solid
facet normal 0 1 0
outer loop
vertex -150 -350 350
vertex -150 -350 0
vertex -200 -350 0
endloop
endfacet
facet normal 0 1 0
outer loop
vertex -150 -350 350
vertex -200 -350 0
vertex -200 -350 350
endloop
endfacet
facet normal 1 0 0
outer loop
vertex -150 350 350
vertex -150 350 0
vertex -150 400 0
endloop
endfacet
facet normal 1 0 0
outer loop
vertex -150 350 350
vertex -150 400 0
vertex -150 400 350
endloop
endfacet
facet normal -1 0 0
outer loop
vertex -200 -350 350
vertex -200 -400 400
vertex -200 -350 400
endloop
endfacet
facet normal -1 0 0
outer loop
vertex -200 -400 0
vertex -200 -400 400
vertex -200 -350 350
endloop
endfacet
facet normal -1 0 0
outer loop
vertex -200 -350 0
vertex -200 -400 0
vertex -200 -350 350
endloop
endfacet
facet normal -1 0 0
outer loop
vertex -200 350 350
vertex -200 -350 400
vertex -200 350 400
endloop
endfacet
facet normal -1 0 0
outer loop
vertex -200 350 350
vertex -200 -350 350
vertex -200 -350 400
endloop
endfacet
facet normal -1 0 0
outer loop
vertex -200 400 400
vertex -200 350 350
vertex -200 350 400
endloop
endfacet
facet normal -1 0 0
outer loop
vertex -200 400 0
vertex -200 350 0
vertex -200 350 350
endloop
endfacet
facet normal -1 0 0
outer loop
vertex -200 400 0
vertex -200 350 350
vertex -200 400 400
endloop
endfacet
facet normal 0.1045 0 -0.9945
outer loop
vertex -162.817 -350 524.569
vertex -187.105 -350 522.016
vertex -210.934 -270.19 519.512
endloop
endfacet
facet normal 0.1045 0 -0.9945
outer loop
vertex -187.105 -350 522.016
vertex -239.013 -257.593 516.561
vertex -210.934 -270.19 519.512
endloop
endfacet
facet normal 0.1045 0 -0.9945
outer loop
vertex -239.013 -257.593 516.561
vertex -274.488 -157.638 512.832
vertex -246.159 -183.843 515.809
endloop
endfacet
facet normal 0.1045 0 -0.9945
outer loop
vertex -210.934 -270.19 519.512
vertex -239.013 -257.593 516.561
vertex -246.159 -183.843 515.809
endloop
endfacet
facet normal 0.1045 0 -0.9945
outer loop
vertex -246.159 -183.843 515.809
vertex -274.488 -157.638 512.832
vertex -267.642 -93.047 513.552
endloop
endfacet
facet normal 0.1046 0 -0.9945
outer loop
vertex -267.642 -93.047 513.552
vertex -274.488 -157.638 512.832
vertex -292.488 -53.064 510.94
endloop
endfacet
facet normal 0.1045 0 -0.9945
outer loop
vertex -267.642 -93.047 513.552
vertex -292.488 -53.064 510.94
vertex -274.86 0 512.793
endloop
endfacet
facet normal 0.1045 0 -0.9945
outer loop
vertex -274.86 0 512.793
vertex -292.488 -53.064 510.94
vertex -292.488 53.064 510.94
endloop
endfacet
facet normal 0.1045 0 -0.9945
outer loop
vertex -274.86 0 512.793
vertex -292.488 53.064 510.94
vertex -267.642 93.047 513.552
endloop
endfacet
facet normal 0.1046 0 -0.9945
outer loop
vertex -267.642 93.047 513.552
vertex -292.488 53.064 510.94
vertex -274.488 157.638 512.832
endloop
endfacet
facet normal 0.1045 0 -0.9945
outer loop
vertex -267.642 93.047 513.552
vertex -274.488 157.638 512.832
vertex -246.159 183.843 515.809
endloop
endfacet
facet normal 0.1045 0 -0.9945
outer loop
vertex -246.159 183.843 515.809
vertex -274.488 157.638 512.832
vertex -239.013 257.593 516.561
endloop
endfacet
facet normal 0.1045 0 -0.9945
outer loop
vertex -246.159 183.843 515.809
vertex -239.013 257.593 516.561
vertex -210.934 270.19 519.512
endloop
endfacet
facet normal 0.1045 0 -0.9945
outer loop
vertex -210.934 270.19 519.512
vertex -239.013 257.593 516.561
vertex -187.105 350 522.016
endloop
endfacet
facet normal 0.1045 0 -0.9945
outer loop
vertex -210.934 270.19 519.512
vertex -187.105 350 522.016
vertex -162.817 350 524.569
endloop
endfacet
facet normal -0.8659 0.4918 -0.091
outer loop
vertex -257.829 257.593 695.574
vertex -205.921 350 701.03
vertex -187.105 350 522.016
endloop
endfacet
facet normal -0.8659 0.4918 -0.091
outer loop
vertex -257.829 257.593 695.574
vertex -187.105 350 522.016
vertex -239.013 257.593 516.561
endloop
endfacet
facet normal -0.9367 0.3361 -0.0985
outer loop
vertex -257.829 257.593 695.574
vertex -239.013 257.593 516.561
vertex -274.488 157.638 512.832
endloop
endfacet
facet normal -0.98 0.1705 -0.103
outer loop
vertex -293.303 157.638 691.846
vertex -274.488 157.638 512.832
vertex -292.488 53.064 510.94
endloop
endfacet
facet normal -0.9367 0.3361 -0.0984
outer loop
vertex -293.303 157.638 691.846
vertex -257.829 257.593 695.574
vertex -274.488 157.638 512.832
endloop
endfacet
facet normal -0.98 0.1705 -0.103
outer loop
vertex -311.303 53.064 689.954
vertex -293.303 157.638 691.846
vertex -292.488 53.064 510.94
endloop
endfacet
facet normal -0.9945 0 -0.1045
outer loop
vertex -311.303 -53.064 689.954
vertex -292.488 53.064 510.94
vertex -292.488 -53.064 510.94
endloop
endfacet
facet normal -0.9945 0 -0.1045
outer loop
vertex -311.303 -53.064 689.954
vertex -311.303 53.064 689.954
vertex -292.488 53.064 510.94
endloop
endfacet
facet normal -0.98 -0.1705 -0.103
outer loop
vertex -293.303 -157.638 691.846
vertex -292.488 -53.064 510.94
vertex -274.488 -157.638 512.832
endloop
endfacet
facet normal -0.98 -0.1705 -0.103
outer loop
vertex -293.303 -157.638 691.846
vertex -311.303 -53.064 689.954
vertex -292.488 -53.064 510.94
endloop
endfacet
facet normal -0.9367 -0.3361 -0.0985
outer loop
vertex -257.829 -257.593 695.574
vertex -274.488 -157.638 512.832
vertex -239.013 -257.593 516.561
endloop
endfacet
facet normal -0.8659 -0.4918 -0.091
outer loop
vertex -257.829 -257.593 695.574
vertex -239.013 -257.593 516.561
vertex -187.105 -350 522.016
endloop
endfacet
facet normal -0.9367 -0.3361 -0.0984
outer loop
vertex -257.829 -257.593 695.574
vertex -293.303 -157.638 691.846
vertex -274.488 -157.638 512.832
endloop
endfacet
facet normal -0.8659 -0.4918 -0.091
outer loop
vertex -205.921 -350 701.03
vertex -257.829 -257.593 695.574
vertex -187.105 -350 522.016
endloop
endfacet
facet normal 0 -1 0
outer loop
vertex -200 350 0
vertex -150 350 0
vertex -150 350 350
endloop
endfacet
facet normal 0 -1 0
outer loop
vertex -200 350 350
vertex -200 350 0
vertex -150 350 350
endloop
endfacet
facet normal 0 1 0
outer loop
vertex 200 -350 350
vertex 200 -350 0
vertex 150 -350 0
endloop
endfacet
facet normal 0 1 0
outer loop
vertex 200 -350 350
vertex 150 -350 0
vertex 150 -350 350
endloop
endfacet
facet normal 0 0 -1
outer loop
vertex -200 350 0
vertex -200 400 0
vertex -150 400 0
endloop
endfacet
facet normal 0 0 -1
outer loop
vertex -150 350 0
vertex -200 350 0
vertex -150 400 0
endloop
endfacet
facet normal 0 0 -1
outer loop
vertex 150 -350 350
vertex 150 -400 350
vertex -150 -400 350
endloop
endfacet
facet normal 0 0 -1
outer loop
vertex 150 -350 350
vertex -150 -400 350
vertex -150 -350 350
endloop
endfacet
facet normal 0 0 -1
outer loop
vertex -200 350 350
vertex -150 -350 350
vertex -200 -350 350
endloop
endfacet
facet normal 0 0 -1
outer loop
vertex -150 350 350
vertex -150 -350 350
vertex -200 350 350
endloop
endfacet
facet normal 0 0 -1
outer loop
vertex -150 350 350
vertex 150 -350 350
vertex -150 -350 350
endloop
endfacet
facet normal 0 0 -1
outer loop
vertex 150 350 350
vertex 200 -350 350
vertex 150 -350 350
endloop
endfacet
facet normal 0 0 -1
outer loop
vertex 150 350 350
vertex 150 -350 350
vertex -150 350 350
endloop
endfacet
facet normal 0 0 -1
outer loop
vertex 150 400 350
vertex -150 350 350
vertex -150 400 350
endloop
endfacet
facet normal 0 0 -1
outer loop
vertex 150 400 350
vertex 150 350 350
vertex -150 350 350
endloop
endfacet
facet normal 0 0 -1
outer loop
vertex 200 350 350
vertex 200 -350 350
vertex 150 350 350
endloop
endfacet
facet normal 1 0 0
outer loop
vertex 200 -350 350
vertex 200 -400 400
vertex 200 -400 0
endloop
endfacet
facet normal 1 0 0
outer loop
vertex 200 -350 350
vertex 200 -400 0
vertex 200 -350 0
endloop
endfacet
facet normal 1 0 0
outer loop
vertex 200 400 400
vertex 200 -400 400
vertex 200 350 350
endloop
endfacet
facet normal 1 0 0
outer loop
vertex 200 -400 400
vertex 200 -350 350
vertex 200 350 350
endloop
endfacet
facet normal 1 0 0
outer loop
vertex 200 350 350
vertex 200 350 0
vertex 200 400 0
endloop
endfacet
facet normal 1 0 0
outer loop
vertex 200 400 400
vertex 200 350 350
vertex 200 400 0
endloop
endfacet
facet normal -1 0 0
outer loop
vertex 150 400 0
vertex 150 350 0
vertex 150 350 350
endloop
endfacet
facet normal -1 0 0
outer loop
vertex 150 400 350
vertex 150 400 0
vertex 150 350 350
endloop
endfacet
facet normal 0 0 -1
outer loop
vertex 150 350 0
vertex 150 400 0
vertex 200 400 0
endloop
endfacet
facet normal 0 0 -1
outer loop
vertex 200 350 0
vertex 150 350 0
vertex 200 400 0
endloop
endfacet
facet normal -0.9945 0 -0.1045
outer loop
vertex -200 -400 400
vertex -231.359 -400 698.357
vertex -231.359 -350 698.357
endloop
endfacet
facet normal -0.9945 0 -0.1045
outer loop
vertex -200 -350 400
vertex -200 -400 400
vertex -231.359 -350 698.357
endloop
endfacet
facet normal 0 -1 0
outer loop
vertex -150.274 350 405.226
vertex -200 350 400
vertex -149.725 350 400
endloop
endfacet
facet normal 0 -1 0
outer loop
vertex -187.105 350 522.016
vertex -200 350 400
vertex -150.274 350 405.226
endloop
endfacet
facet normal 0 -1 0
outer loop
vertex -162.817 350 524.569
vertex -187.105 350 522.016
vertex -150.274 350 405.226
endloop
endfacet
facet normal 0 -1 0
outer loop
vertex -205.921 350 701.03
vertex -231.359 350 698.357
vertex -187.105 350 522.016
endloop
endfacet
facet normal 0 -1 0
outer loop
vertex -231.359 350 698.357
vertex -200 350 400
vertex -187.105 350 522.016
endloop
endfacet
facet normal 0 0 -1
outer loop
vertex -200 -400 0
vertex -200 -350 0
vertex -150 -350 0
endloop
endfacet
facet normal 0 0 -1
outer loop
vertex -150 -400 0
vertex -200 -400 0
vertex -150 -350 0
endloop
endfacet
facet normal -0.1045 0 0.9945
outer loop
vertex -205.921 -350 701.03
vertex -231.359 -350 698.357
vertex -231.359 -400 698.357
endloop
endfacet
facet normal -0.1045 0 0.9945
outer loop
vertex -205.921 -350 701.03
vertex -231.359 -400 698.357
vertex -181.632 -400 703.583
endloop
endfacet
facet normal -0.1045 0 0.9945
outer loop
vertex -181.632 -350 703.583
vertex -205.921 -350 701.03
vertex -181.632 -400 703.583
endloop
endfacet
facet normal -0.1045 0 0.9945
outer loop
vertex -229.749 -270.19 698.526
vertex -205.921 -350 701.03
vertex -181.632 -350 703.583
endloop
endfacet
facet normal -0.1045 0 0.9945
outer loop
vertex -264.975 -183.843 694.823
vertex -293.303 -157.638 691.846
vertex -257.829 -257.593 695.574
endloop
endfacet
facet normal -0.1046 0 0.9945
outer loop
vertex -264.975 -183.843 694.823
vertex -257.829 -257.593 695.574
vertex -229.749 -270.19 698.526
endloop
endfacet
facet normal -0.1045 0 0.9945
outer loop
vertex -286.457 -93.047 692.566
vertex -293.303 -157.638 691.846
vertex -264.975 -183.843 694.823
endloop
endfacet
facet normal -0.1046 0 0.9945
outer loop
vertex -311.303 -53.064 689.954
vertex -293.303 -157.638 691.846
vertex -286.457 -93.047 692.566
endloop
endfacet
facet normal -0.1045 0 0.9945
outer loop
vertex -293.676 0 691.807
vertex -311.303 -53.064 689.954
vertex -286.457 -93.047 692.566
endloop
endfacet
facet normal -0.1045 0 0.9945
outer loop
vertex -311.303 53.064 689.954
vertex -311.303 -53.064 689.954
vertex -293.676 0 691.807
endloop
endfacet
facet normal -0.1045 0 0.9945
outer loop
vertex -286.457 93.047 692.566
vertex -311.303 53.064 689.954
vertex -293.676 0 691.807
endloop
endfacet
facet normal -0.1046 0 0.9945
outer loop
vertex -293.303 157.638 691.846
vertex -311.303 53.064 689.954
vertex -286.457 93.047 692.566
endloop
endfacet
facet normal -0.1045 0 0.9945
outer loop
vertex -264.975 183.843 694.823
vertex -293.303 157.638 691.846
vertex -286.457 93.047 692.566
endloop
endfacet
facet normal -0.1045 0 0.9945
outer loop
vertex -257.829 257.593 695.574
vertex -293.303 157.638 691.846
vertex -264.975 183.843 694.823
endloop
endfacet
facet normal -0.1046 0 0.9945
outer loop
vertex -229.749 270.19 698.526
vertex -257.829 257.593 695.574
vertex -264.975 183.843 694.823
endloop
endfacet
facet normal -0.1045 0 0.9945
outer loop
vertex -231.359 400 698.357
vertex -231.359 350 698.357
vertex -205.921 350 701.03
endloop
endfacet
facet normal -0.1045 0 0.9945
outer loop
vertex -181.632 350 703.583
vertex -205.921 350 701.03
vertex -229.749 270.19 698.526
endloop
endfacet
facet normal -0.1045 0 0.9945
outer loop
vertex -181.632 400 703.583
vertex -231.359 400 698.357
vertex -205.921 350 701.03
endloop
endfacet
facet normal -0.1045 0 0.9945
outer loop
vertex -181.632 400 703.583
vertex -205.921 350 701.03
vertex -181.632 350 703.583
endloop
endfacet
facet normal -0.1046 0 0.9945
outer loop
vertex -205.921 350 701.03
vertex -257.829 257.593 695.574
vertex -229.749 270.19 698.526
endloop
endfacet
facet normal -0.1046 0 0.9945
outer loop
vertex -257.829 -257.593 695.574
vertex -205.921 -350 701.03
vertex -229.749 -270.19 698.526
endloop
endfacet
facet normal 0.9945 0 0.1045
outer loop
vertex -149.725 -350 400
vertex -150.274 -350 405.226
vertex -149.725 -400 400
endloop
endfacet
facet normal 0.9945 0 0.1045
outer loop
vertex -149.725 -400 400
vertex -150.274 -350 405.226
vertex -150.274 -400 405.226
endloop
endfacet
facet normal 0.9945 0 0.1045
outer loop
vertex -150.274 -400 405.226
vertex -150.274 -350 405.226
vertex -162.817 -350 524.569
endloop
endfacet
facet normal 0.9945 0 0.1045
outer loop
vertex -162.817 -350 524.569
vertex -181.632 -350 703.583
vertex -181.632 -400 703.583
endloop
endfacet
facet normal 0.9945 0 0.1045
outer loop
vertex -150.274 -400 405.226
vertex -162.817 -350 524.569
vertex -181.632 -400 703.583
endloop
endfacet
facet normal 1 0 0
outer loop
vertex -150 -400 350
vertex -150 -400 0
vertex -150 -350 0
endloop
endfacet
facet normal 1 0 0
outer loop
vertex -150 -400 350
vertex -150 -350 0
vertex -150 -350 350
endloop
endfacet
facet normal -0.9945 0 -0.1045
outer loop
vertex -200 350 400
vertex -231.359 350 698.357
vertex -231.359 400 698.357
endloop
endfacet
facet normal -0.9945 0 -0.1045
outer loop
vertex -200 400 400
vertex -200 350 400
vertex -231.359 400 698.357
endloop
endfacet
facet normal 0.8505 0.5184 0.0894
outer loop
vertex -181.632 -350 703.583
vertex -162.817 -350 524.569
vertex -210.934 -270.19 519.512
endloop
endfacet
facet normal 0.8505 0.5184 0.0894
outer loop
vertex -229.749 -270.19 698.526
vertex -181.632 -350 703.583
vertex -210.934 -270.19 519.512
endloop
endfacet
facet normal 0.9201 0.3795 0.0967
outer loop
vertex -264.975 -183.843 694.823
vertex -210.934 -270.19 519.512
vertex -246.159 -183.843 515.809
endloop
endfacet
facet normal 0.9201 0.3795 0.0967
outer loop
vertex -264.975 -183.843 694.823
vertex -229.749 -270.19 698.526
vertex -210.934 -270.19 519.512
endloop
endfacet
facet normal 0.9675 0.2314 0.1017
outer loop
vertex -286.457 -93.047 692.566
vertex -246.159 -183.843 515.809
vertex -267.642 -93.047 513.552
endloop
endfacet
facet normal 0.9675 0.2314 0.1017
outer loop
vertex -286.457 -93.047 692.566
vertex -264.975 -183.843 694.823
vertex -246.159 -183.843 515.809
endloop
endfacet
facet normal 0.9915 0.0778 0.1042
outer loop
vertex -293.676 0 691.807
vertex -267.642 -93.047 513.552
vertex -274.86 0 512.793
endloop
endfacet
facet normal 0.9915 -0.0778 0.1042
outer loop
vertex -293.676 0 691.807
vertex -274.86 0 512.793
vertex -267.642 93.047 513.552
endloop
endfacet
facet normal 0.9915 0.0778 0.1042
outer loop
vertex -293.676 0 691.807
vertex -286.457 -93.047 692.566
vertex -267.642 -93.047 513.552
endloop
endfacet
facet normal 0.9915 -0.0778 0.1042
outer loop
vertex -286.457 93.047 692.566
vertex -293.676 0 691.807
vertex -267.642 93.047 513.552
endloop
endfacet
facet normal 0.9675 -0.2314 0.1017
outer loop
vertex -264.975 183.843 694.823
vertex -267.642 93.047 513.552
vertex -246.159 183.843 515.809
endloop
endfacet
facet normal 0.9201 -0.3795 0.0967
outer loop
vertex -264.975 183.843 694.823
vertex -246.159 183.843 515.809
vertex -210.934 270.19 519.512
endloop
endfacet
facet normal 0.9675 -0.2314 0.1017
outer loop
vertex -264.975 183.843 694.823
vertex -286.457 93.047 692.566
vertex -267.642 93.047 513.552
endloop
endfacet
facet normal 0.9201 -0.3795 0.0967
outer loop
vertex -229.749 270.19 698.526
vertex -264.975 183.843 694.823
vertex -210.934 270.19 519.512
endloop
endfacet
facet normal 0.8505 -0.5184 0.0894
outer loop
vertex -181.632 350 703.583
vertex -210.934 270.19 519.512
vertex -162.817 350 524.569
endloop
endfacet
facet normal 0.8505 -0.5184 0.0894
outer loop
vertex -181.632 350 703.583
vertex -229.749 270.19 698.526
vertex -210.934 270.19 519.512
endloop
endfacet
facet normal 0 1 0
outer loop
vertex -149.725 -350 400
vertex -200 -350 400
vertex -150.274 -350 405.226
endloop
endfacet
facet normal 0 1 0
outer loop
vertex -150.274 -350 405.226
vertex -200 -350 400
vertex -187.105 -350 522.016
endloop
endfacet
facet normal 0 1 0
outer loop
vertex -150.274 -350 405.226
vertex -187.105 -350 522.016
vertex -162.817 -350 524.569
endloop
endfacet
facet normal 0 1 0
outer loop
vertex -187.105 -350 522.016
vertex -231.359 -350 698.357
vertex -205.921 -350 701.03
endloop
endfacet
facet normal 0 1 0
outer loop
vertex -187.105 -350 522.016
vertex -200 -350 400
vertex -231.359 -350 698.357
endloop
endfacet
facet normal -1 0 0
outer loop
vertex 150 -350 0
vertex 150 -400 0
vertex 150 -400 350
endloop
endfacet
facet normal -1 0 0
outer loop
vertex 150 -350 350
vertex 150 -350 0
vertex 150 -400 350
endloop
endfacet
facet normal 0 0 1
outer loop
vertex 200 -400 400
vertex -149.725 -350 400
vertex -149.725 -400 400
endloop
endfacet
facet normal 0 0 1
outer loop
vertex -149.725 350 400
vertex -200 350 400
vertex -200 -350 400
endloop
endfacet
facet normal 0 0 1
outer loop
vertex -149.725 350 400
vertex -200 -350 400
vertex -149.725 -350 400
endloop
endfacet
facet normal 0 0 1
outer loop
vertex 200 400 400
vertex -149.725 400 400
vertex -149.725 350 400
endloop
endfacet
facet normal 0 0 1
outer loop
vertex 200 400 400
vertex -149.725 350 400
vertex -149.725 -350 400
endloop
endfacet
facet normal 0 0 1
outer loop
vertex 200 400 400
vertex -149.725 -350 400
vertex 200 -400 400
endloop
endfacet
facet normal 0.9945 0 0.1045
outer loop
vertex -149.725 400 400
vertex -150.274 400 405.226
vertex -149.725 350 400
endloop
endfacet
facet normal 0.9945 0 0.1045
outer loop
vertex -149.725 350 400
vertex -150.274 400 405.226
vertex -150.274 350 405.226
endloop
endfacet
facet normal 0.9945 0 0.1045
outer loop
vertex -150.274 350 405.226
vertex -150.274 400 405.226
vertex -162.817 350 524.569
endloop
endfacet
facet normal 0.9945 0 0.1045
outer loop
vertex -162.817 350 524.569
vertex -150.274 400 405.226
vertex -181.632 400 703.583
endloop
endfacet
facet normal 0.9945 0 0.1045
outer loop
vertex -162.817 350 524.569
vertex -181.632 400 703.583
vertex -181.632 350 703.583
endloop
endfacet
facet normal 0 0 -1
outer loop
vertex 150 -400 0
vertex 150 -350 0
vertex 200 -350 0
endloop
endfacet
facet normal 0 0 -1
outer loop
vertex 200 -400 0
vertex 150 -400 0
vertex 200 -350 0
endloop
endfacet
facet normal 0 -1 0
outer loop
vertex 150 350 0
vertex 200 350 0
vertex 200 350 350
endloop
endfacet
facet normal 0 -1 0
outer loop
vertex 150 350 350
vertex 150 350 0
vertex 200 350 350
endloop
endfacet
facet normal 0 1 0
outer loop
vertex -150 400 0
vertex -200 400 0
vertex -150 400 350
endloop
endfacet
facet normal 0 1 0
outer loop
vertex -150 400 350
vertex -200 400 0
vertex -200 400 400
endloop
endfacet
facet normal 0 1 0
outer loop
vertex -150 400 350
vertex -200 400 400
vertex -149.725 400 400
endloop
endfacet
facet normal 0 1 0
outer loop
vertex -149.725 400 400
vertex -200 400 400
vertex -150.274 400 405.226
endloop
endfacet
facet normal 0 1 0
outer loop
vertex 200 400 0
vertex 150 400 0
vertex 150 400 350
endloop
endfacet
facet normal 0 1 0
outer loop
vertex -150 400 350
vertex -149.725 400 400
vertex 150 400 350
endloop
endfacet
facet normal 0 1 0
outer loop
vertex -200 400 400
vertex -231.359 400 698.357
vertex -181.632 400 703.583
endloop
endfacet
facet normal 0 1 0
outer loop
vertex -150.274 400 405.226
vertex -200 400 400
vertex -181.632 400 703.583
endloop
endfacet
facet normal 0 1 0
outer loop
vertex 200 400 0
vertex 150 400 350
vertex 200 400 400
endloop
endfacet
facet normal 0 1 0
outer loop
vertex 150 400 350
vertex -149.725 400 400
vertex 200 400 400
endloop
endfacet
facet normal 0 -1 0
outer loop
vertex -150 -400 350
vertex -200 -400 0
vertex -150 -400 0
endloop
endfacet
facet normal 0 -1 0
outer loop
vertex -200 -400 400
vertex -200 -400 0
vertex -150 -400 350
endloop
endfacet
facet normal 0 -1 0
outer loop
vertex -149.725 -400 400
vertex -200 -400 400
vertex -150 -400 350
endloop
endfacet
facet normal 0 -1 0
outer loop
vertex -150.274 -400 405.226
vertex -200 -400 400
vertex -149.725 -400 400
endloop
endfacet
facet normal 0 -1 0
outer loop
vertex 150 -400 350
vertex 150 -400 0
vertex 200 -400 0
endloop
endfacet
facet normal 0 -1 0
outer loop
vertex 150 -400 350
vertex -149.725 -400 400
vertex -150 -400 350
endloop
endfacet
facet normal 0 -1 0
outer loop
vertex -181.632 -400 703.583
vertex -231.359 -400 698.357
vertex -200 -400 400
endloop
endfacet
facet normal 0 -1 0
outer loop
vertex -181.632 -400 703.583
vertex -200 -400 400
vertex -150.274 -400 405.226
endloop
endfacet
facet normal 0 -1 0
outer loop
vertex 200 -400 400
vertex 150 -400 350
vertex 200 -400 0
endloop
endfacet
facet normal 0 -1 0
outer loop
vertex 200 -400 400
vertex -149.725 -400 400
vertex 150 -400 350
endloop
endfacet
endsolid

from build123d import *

# Parameters (mm, degrees)
F0_W       = 400
F0_H       = 800
F1_DEPTH   = 400
F2_W       = 300
F2_H       = 350
F3_DEPTH   = 800.001
F4_W       = 700
F4_H       = 350
F5_DEPTH   = 400.001
F10_W      = 800
F10_H      = 300
F11_DEPTH  = 50
F12_W      = 700
F12_H      = 300
F13_DEPTH  = 429.5428217516
F13_FACE_W = 50
F13_FACE_H = 50
F18_DEPTH  = 180


with BuildPart() as f1:
    # F0 (on Top) → F1 (new body)
    with BuildSketch(Plane.XY):
        Rectangle(F0_W, F0_H)
    extrude(amount=F1_DEPTH)

    # F2 (on face) → F3 (cut, through all)
    with BuildSketch(Plane.XZ.offset(400)):
        with Locations((0, 175)):
            Rectangle(F2_W, F2_H)
    extrude(amount=-F3_DEPTH, mode=Mode.SUBTRACT)

    # F4 (on face) → F5 (cut, through all)
    with BuildSketch(Plane.YZ.offset(200)):
        with Locations((0, 175)):
            Rectangle(F4_W, F4_H)
    extrude(amount=-F5_DEPTH, mode=Mode.SUBTRACT)

    # F10 (on face) → F11 (join)
    with BuildSketch(Plane(origin=(-156.2324219098, 0, -16.4206892285), x_dir=(0, 1, 0), z_dir=(0.9945218954, 0, 0.1045284633))):
        with Locations((0, 568.7144508008)):
            Rectangle(F10_W, F10_H)
    extrude(amount=F11_DEPTH)

    # F12 (on face) → F13 (cut, through all)
    with BuildSketch(Plane(origin=(-156.2324219098, 0, -16.4206892285), x_dir=(0, -1, 0), z_dir=(-0.9945218954, 0, -0.1045284633))):
        with Locations((0, 568.7144508008)):
            Rectangle(F12_W, F12_H)
    extrude(amount=-F13_DEPTH, mode=Mode.SUBTRACT)

    # F13_face (on face) → F14 (join, up to the next surface of F1)
    with BuildSketch(Plane(origin=(-175.1369526158, -375, 402.6132115817), x_dir=(1, 0, 0), z_dir=(0.1045284633, 0, -0.9945218954))):
        Rectangle(F13_FACE_W, F13_FACE_H)
    extrude(until=Until.NEXT)

    # F13_face (on face) → F15 (join, up to the next surface of F1)
    with BuildSketch(Plane(origin=(-175.1369526158, -375, 402.6132115817), x_dir=(1, 0, 0), z_dir=(0.1045284633, 0, -0.9945218954))):
        with Locations((0, -750)):
            Rectangle(F13_FACE_W, F13_FACE_H)
    extrude(until=Until.NEXT)

    # F17 (on plane+point) → F18 (join)
    with BuildSketch(Plane(origin=(-75.1261170705, 0, 714.777257839), x_dir=(0.9945218954, 0, 0.1045284633), z_dir=(-0.1045284633, 0, 0.9945218954))):
        with BuildLine():
            ThreePointArc((-107.0929937666, -350), (-219.7532765261, 0), (-107.0929937666, 350))
            Line((-107.0929937666, 350), (-123.3376510079, 361.6666666667))
            ThreePointArc((-123.3376510079, 361.6666666667), (-239.7532765261, 0), (-123.3376510079, -361.6666666667))
            Line((-123.3376510079, -361.6666666667), (-107.0929937666, -350))
        make_face()
    extrude(amount=-F18_DEPTH)


solid = f1.part
